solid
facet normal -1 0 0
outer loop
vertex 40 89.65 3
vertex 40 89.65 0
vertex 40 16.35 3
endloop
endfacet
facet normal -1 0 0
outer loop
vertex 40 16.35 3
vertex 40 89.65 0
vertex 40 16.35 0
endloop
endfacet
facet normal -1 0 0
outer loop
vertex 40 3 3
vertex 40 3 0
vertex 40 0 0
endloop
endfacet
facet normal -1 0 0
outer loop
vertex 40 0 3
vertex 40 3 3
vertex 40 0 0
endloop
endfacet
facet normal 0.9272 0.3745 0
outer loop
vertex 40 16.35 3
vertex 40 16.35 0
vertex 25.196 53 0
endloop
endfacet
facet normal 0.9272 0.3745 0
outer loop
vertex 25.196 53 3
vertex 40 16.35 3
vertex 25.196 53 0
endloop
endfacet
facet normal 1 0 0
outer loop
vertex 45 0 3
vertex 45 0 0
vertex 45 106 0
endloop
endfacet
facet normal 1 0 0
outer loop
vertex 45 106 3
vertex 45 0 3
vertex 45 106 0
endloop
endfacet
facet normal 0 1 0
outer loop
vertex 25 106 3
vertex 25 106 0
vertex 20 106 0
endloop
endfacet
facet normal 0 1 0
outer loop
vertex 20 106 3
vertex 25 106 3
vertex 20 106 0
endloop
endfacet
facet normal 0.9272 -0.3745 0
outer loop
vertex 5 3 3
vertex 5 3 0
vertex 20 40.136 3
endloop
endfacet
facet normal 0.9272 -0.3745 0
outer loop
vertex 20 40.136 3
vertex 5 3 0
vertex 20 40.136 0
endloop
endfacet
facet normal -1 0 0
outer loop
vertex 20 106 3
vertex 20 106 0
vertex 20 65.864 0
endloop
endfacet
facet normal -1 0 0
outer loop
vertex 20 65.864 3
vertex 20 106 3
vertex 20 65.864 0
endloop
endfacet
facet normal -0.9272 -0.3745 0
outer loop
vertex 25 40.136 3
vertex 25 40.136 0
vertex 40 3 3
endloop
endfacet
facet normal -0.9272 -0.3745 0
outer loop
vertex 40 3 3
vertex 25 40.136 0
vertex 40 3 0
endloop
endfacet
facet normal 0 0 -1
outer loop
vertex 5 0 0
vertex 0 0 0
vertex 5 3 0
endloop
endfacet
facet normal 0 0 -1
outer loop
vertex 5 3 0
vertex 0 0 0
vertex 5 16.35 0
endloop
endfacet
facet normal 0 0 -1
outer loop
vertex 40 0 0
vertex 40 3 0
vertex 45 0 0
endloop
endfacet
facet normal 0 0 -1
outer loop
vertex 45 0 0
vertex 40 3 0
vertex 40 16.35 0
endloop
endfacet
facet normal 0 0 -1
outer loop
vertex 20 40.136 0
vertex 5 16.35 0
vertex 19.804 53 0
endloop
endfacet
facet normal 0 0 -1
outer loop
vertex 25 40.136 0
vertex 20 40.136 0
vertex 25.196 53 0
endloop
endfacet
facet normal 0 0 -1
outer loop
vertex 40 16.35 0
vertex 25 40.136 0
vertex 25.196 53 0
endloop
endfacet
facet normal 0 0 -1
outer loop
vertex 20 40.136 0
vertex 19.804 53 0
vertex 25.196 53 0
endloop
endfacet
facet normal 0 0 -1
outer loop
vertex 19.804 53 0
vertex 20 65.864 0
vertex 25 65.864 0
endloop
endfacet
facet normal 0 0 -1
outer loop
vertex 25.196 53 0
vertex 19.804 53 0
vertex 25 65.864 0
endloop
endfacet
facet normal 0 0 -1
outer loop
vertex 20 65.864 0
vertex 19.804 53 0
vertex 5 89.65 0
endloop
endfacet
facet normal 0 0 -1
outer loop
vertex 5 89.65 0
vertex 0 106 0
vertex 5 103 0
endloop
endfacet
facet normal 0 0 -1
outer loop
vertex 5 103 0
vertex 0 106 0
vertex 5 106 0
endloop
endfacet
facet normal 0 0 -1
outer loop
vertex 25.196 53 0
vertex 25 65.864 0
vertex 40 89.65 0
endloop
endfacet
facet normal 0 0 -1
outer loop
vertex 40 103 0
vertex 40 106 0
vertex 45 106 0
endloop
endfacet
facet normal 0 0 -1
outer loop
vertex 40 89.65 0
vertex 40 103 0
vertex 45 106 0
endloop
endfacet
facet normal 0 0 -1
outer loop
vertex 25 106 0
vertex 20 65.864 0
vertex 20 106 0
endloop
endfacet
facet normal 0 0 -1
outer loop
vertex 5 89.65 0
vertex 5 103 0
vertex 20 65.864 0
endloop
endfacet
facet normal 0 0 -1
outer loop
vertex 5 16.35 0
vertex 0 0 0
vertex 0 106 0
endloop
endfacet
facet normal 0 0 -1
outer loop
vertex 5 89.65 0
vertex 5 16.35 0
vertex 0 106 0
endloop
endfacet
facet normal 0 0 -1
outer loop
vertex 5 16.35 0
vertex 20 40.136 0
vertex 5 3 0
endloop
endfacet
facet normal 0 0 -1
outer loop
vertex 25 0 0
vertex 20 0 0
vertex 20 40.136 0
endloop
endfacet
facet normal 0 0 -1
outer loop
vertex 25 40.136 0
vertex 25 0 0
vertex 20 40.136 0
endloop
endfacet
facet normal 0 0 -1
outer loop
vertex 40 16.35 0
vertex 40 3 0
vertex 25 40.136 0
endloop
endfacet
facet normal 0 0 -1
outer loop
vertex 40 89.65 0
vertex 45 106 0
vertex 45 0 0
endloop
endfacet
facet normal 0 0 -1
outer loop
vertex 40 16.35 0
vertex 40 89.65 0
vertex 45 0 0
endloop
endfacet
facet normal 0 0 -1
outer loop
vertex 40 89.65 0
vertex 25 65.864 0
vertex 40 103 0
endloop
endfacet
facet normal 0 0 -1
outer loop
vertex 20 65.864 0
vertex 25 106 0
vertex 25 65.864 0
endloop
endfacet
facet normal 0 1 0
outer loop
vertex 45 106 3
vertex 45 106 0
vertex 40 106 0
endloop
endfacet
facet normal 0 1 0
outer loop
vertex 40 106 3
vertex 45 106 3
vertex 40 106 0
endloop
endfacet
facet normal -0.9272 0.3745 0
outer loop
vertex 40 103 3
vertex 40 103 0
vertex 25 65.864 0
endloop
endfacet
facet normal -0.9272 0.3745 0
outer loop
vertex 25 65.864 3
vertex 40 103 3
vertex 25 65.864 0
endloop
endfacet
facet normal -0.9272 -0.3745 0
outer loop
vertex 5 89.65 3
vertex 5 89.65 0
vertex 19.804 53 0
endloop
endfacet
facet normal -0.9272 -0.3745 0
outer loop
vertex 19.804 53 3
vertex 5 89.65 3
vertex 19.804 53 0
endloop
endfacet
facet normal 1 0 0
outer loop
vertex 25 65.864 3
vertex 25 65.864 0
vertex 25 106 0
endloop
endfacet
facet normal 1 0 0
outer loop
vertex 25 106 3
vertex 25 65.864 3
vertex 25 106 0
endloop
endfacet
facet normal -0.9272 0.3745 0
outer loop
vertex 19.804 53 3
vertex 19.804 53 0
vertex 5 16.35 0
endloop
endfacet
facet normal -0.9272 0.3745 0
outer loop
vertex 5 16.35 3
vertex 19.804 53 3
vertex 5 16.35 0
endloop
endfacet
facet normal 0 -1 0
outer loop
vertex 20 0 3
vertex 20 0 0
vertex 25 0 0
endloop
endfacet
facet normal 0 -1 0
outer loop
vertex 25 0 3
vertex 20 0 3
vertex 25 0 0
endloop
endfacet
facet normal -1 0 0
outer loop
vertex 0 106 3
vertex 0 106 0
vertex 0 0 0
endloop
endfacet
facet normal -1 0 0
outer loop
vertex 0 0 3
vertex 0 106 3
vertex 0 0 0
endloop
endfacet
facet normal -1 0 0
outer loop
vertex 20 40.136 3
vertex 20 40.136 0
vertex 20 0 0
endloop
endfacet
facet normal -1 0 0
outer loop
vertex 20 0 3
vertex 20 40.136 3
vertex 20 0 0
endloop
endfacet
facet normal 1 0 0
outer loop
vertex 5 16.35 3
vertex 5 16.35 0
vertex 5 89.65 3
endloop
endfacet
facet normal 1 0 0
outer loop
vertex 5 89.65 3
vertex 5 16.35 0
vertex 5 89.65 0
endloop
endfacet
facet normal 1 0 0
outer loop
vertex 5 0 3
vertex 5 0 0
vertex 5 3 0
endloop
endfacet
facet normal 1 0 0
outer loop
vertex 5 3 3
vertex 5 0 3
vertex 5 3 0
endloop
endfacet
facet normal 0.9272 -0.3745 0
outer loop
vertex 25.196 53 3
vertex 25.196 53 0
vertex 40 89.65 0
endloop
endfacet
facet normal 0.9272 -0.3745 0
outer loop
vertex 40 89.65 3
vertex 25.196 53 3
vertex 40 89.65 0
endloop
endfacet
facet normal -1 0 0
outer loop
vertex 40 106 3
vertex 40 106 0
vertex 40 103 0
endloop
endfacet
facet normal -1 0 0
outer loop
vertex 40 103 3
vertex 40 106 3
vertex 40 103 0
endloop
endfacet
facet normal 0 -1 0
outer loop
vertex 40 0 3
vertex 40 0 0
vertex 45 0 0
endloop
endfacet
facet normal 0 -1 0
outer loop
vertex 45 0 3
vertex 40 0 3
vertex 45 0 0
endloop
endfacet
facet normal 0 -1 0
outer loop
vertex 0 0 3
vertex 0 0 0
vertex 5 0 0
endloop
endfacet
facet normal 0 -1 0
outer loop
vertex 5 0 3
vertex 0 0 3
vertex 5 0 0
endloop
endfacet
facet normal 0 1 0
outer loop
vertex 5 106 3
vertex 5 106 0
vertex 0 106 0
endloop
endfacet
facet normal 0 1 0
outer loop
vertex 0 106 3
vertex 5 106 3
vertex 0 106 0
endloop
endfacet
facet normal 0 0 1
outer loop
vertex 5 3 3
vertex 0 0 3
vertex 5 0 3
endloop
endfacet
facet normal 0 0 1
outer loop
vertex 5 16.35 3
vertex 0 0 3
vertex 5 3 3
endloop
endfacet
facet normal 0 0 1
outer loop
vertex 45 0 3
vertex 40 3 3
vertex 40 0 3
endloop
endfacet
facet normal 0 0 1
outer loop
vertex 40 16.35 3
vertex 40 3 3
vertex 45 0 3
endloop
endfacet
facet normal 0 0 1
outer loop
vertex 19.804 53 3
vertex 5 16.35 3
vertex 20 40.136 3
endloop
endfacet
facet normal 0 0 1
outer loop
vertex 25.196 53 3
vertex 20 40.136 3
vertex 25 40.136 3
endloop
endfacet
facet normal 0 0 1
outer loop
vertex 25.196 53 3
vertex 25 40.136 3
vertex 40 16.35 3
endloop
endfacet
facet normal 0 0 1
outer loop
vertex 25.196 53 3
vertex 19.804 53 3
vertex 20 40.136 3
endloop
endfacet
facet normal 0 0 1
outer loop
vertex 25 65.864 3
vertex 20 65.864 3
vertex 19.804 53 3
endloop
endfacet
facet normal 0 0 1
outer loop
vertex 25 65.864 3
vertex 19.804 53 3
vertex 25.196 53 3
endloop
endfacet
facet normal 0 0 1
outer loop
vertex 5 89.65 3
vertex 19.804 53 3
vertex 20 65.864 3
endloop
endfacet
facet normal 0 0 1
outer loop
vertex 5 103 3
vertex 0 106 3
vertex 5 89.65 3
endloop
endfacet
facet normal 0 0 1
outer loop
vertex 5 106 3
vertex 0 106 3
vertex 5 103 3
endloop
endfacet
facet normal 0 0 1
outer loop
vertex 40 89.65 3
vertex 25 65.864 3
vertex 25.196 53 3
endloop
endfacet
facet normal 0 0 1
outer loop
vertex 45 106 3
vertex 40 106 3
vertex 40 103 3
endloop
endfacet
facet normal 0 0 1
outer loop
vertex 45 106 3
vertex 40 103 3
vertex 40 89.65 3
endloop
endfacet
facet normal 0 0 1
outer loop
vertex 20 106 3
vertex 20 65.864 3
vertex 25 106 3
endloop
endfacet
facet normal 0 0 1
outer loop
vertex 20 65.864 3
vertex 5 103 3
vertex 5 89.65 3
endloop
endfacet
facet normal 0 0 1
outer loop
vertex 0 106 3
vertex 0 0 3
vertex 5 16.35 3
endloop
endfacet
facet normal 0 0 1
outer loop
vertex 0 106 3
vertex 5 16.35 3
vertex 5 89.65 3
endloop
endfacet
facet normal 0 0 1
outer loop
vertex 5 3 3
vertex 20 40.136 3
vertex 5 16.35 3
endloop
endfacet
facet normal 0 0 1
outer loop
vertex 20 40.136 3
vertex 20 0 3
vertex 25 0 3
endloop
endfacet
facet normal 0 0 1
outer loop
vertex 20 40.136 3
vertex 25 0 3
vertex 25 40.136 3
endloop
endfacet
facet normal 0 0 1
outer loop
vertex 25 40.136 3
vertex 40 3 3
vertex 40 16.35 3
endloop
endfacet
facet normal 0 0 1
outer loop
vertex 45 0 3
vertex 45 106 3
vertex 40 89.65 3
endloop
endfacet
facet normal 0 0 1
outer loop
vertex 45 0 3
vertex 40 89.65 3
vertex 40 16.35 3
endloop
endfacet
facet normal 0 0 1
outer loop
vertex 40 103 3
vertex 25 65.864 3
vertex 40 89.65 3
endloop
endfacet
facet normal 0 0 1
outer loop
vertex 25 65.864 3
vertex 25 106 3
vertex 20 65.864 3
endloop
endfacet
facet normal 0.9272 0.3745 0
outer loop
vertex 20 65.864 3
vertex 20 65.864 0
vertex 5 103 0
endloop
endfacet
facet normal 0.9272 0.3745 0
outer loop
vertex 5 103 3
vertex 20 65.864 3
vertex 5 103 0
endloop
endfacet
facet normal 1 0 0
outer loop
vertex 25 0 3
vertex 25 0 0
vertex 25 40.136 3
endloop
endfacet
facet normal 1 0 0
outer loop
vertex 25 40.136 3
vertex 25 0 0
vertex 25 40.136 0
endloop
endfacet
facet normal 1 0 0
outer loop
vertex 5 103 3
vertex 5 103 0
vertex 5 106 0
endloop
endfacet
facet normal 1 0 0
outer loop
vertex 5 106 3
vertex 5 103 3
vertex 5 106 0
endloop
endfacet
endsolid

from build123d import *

# Parameters (mm, degrees)
BOSS_EXTRUDE1_DEPTH = 3


with BuildPart() as part:
    # Sketch1 → Boss-Extrude1 (new body)
    with BuildSketch(Plane.XY):
        Polygon((25, 106), (20, 106), (20, 65.864378278), (5, 103), (5, 106), (0, 106), (0, 0), (5, 0), (5, 3), (20, 40.135621722), (20, 0), (25, 0), (25, 40.135621722), (40, 3), (40, 0), (45, 0), (45, 106), (40, 106), (40, 103), (25, 65.864378278), align=None)
        Polygon((40, 16.350215981), (25.196241916, 53), (40, 89.649784019), align=None, mode=Mode.SUBTRACT)
        Polygon((19.803758084, 53), (5, 16.350215981), (5, 89.649784019), align=None, mode=Mode.SUBTRACT)
    extrude(amount=BOSS_EXTRUDE1_DEPTH)


solid = part.part
